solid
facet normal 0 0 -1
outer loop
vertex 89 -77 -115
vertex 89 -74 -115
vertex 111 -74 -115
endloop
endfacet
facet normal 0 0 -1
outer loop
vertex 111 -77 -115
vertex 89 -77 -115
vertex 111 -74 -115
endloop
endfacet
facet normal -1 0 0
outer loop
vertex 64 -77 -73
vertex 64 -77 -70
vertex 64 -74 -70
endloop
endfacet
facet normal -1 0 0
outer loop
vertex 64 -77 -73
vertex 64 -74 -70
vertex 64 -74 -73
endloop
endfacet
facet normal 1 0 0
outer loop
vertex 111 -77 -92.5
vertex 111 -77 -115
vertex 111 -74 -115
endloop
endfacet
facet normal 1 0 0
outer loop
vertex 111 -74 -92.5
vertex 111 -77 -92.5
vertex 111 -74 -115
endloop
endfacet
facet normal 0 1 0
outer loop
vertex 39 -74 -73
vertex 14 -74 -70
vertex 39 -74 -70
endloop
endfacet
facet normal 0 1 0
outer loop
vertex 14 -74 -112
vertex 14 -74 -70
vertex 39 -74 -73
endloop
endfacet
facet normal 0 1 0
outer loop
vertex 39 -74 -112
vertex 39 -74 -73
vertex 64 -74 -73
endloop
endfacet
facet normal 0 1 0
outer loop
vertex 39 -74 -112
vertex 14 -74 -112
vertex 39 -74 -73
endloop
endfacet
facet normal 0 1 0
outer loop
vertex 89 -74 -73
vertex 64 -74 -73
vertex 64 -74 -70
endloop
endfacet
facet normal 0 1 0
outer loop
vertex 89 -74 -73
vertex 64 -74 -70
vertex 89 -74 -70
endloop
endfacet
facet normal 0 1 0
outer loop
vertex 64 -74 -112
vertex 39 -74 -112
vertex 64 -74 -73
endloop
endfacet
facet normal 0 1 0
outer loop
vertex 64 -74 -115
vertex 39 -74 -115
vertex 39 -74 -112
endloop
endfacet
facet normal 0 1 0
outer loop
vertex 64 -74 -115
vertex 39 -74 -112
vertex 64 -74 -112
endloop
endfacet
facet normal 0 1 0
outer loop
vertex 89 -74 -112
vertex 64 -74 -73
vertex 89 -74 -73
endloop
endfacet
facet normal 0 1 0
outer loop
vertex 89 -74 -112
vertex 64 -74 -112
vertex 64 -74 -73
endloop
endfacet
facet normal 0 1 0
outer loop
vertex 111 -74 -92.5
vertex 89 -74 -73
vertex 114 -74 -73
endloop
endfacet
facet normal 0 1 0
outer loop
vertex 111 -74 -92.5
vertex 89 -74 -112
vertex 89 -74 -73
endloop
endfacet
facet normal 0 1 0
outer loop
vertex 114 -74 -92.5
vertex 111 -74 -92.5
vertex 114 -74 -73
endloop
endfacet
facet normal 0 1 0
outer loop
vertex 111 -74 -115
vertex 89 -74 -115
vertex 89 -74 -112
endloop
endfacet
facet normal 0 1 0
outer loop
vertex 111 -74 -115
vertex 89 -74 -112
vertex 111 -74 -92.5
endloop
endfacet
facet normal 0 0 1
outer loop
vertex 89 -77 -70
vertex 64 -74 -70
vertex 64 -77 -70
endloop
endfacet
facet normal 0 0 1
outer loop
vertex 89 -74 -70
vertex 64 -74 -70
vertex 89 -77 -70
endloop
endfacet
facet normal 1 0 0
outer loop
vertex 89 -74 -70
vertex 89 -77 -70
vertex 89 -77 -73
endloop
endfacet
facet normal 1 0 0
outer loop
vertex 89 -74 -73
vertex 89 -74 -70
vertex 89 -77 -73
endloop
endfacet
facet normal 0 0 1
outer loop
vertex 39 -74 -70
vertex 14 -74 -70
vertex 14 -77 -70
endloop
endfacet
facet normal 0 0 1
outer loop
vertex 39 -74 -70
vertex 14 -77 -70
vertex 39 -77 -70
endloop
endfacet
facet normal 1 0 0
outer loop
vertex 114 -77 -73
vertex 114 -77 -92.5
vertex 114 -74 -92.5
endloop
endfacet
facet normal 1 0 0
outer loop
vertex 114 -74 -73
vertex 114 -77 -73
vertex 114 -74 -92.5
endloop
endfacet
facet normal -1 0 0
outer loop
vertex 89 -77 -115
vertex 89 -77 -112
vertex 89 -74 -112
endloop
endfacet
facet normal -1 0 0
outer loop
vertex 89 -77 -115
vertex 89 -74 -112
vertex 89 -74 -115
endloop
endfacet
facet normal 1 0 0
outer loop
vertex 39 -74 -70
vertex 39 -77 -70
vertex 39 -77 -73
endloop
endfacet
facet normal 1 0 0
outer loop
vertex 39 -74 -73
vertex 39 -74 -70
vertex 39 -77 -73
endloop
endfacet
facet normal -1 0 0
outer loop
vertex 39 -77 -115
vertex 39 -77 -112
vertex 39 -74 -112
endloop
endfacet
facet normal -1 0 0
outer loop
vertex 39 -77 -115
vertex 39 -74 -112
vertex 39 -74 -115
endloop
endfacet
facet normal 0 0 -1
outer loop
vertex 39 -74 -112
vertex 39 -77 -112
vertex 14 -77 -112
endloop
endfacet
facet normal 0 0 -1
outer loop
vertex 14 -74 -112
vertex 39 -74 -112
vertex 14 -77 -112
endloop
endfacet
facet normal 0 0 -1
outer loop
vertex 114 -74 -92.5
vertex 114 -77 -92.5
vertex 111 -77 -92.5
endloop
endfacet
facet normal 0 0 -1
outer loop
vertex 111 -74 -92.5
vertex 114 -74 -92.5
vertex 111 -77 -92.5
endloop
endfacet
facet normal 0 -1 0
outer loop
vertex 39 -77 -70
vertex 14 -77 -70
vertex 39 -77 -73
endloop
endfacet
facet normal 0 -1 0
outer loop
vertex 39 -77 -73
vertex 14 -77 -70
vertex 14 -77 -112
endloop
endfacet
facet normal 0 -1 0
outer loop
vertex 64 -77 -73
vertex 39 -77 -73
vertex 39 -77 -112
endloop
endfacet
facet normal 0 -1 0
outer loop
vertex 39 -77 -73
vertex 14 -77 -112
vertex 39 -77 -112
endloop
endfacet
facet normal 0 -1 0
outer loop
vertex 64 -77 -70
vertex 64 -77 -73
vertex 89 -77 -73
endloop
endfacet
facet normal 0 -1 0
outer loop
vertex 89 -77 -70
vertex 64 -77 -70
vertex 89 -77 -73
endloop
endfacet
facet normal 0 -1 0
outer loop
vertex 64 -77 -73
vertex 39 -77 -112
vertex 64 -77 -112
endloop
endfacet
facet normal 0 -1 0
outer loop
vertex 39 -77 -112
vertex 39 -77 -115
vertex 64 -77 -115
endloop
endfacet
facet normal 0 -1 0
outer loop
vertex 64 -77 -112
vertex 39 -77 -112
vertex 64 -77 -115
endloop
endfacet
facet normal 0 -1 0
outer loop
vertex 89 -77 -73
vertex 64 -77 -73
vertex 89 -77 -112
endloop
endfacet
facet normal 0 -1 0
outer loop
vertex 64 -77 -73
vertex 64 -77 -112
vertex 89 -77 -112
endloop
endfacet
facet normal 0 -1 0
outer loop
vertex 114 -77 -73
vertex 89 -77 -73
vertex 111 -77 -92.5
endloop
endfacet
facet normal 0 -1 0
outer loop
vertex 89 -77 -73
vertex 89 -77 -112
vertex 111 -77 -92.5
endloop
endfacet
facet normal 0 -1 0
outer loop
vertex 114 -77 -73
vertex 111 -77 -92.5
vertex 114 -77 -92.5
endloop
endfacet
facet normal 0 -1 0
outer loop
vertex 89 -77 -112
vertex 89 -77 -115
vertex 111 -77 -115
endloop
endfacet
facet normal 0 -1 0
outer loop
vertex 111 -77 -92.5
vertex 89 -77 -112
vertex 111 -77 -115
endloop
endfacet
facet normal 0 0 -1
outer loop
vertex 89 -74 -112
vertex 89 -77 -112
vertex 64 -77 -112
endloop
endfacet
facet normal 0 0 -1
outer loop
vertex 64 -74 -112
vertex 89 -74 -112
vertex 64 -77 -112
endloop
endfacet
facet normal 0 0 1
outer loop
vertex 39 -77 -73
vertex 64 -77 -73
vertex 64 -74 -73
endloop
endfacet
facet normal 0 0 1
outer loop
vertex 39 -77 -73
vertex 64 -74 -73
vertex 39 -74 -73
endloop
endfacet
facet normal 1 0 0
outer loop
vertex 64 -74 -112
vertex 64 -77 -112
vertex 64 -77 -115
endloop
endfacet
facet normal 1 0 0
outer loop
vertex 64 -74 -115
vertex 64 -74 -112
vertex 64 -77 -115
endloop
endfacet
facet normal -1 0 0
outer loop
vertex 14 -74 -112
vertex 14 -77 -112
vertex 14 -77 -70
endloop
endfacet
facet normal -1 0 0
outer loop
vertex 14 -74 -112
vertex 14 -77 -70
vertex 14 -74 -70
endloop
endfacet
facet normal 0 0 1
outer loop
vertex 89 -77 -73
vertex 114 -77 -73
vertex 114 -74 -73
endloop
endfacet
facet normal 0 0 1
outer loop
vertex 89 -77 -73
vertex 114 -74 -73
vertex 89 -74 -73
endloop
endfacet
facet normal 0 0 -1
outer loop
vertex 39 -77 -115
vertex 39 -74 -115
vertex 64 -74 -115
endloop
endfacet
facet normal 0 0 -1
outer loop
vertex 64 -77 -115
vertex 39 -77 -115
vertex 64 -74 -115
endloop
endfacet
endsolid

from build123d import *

# Parameters (mm, degrees)
RECTANGLE134_W                               = 40
RECTANGLE134_H                               = 3
EXTRUDE175_DEPTH                             = 3
RECTANGLE135_W                               = 40
RECTANGLE135_H                               = 3
EXTRUDE176_DEPTH                             = 3
RECTANGLE133_W                               = 40
RECTANGLE133_H                               = 3
EXTRUDE174_DEPTH                             = 3
RECTANGLE130_AS_DRAWN_W                      = 25
RECTANGLE130_AS_DRAWN_H                      = 3
EXTRUDE152_DEPTH                             = 3
EXTRUDE152_ONTO_RECTANGLE130_ROLL_ANGLE      = -90
EXTRUDE152_ONTO_RECTANGLE130_PLACEMENT_ANGLE = 180
RECTANGLE128_AS_DRAWN_W                      = 25
RECTANGLE128_AS_DRAWN_H                      = 3
EXTRUDE153_DEPTH                             = 3
EXTRUDE153_ONTO_RECTANGLE128_ROLL_ANGLE      = -90
EXTRUDE153_ONTO_RECTANGLE128_PLACEMENT_ANGLE = 180
RECTANGLE132_AS_DRAWN_W                      = 3
RECTANGLE132_AS_DRAWN_H                      = 19.5
EXTRUDE166_DEPTH                             = 3
EXTRUDE166_ONTO_RECTANGLE132_ROLL_ANGLE      = -90
EXTRUDE166_ONTO_RECTANGLE132_PLACEMENT_ANGLE = 180
RECTANGLE127_AS_DRAWN_W                      = 25
RECTANGLE127_AS_DRAWN_H                      = 3
EXTRUDE147_DEPTH                             = 3
EXTRUDE147_ONTO_RECTANGLE127_ROLL_ANGLE      = -90
EXTRUDE147_ONTO_RECTANGLE127_PLACEMENT_ANGLE = 180
RECTANGLE129_AS_DRAWN_W                      = 25
RECTANGLE129_AS_DRAWN_H                      = 3
EXTRUDE149_DEPTH                             = 3
EXTRUDE149_ONTO_RECTANGLE129_ROLL_ANGLE      = -90
EXTRUDE149_ONTO_RECTANGLE129_PLACEMENT_ANGLE = 180
BOX042_W                                     = 100
BOX042_H                                     = 3
BOX042_DEPTH                                 = 45


with BuildPart() as extrude175:
    # Rectangle134 → Extrude175 (new body)
    with BuildSketch(Plane(origin=(114, 38, -112), x_dir=(0, 1, 0), z_dir=(1, 0, 0))):
        with Locations((20, -1.5)):
            Rectangle(RECTANGLE134_W, RECTANGLE134_H)
    extrude(amount=EXTRUDE175_DEPTH)


with BuildPart() as extrude176:
    # Rectangle135 → Extrude176 (new body)
    with BuildSketch(Plane(origin=(114, -19.5, -112), x_dir=(0, 1, 0), z_dir=(1, 0, 0))):
        with Locations((20, -1.5)):
            Rectangle(RECTANGLE135_W, RECTANGLE135_H)
    extrude(amount=EXTRUDE176_DEPTH)


with BuildPart() as fusion064043:
    # Rectangle133 → Extrude174 (new body)
    with BuildSketch(Plane(origin=(114, -77, -112), x_dir=(0, 1, 0), z_dir=(1, 0, 0))):
        with Locations((20, -1.5)):
            Rectangle(RECTANGLE133_W, RECTANGLE133_H)
    extrude(amount=EXTRUDE174_DEPTH)

    # Fusion064043: union Extrude175, Extrude176
    add(extrude175.part)
    add(extrude176.part)


with BuildPart() as fusion064043_1:
    # Fusion064043 placement: moved
    add(fusion064043.part.moved(Location((-3, 0, 0))))


with BuildPart() as extrude152:
    # Rectangle130 as drawn → Extrude152 (new)
    with BuildSketch(Plane.XY):
        with Locations((12.5, 1.5)):
            Rectangle(RECTANGLE130_AS_DRAWN_W, RECTANGLE130_AS_DRAWN_H)
    extrude(amount=-EXTRUDE152_DEPTH)


with BuildPart() as extrude152_1:
    # Extrude152 onto Rectangle130 roll: moved
    add(extrude152.part.rotate(Axis((0, 0, 0), (1, 0, 0)), EXTRUDE152_ONTO_RECTANGLE130_ROLL_ANGLE))


with BuildPart() as extrude152_2:
    # Extrude152 onto Rectangle130 placement: moved
    add(extrude152_1.part.moved(Location((39, -77, -70))).rotate(Axis((39, -77, -70), (0, 0, 1)), EXTRUDE152_ONTO_RECTANGLE130_PLACEMENT_ANGLE))


with BuildPart() as extrude152_3:
    # Extrude152 placement: moved
    add(extrude152_2.part.moved(Location((0, 0, -42))))


with BuildPart() as extrude153:
    # Rectangle128 as drawn → Extrude153 (new)
    with BuildSketch(Plane.XY):
        with Locations((12.5, 1.5)):
            Rectangle(RECTANGLE128_AS_DRAWN_W, RECTANGLE128_AS_DRAWN_H)
    extrude(amount=-EXTRUDE153_DEPTH)


with BuildPart() as extrude153_1:
    # Extrude153 onto Rectangle128 roll: moved
    add(extrude153.part.rotate(Axis((0, 0, 0), (1, 0, 0)), EXTRUDE153_ONTO_RECTANGLE128_ROLL_ANGLE))


with BuildPart() as extrude153_2:
    # Extrude153 onto Rectangle128 placement: moved
    add(extrude153_1.part.moved(Location((89, -77, -70))).rotate(Axis((89, -77, -70), (0, 0, 1)), EXTRUDE153_ONTO_RECTANGLE128_PLACEMENT_ANGLE))


with BuildPart() as extrude153_3:
    # Extrude153 placement: moved
    add(extrude153_2.part.moved(Location((0, 0, -42))))


with BuildPart() as extrude166:
    # Rectangle132 as drawn → Extrude166 (new)
    with BuildSketch(Plane.XY):
        with Locations((1.5, 9.75)):
            Rectangle(RECTANGLE132_AS_DRAWN_W, RECTANGLE132_AS_DRAWN_H)
    extrude(amount=-EXTRUDE166_DEPTH)


with BuildPart() as extrude166_1:
    # Extrude166 onto Rectangle132 roll: moved
    add(extrude166.part.rotate(Axis((0, 0, 0), (1, 0, 0)), EXTRUDE166_ONTO_RECTANGLE132_ROLL_ANGLE))


with BuildPart() as extrude166_2:
    # Extrude166 onto Rectangle132 placement: moved
    add(extrude166_1.part.moved(Location((114, -77, -92.5))).rotate(Axis((114, -77, -92.5), (0, 0, 1)), EXTRUDE166_ONTO_RECTANGLE132_PLACEMENT_ANGLE))


with BuildPart() as extrude147:
    # Rectangle127 as drawn → Extrude147 (new)
    with BuildSketch(Plane.XY):
        with Locations((12.5, 1.5)):
            Rectangle(RECTANGLE127_AS_DRAWN_W, RECTANGLE127_AS_DRAWN_H)
    extrude(amount=-EXTRUDE147_DEPTH)


with BuildPart() as extrude147_1:
    # Extrude147 onto Rectangle127 roll: moved
    add(extrude147.part.rotate(Axis((0, 0, 0), (1, 0, 0)), EXTRUDE147_ONTO_RECTANGLE127_ROLL_ANGLE))


with BuildPart() as extrude147_2:
    # Extrude147 onto Rectangle127 placement: moved
    add(extrude147_1.part.moved(Location((114, -77, -70))).rotate(Axis((114, -77, -70), (0, 0, 1)), EXTRUDE147_ONTO_RECTANGLE127_PLACEMENT_ANGLE))


with BuildPart() as fusion064024:
    # Rectangle129 as drawn → Extrude149 (new)
    with BuildSketch(Plane.XY):
        with Locations((12.5, 1.5)):
            Rectangle(RECTANGLE129_AS_DRAWN_W, RECTANGLE129_AS_DRAWN_H)
    extrude(amount=-EXTRUDE149_DEPTH)


with BuildPart() as fusion064024_1:
    # Extrude149 onto Rectangle129 roll: moved
    add(fusion064024.part.rotate(Axis((0, 0, 0), (1, 0, 0)), EXTRUDE149_ONTO_RECTANGLE129_ROLL_ANGLE))


with BuildPart() as fusion064024_2:
    # Extrude149 onto Rectangle129 placement: moved
    add(fusion064024_1.part.moved(Location((64, -77, -70))).rotate(Axis((64, -77, -70), (0, 0, 1)), EXTRUDE149_ONTO_RECTANGLE129_PLACEMENT_ANGLE))

    # Fusion064024: union Extrude152, Extrude153, Extrude166, Extrude147
    add(extrude152_3.part)
    add(extrude153_3.part)
    add(extrude166_2.part)
    add(extrude147_2.part)


with BuildPart() as cut035028:
    # Box042 → Box042 (new body)
    with BuildSketch(Plane(origin=(14, -77, -115), x_dir=(1, 0, 0), z_dir=(0, 0, 1))):
        with Locations((50, 1.5)):
            Rectangle(BOX042_W, BOX042_H)
    extrude(amount=BOX042_DEPTH)

    # Cut035013: cut Fusion064024
    add(fusion064024_2.part, mode=Mode.SUBTRACT)

    # Cut035028: cut Fusion064043
    add(fusion064043_1.part, mode=Mode.SUBTRACT)


solid = cut035028.part
